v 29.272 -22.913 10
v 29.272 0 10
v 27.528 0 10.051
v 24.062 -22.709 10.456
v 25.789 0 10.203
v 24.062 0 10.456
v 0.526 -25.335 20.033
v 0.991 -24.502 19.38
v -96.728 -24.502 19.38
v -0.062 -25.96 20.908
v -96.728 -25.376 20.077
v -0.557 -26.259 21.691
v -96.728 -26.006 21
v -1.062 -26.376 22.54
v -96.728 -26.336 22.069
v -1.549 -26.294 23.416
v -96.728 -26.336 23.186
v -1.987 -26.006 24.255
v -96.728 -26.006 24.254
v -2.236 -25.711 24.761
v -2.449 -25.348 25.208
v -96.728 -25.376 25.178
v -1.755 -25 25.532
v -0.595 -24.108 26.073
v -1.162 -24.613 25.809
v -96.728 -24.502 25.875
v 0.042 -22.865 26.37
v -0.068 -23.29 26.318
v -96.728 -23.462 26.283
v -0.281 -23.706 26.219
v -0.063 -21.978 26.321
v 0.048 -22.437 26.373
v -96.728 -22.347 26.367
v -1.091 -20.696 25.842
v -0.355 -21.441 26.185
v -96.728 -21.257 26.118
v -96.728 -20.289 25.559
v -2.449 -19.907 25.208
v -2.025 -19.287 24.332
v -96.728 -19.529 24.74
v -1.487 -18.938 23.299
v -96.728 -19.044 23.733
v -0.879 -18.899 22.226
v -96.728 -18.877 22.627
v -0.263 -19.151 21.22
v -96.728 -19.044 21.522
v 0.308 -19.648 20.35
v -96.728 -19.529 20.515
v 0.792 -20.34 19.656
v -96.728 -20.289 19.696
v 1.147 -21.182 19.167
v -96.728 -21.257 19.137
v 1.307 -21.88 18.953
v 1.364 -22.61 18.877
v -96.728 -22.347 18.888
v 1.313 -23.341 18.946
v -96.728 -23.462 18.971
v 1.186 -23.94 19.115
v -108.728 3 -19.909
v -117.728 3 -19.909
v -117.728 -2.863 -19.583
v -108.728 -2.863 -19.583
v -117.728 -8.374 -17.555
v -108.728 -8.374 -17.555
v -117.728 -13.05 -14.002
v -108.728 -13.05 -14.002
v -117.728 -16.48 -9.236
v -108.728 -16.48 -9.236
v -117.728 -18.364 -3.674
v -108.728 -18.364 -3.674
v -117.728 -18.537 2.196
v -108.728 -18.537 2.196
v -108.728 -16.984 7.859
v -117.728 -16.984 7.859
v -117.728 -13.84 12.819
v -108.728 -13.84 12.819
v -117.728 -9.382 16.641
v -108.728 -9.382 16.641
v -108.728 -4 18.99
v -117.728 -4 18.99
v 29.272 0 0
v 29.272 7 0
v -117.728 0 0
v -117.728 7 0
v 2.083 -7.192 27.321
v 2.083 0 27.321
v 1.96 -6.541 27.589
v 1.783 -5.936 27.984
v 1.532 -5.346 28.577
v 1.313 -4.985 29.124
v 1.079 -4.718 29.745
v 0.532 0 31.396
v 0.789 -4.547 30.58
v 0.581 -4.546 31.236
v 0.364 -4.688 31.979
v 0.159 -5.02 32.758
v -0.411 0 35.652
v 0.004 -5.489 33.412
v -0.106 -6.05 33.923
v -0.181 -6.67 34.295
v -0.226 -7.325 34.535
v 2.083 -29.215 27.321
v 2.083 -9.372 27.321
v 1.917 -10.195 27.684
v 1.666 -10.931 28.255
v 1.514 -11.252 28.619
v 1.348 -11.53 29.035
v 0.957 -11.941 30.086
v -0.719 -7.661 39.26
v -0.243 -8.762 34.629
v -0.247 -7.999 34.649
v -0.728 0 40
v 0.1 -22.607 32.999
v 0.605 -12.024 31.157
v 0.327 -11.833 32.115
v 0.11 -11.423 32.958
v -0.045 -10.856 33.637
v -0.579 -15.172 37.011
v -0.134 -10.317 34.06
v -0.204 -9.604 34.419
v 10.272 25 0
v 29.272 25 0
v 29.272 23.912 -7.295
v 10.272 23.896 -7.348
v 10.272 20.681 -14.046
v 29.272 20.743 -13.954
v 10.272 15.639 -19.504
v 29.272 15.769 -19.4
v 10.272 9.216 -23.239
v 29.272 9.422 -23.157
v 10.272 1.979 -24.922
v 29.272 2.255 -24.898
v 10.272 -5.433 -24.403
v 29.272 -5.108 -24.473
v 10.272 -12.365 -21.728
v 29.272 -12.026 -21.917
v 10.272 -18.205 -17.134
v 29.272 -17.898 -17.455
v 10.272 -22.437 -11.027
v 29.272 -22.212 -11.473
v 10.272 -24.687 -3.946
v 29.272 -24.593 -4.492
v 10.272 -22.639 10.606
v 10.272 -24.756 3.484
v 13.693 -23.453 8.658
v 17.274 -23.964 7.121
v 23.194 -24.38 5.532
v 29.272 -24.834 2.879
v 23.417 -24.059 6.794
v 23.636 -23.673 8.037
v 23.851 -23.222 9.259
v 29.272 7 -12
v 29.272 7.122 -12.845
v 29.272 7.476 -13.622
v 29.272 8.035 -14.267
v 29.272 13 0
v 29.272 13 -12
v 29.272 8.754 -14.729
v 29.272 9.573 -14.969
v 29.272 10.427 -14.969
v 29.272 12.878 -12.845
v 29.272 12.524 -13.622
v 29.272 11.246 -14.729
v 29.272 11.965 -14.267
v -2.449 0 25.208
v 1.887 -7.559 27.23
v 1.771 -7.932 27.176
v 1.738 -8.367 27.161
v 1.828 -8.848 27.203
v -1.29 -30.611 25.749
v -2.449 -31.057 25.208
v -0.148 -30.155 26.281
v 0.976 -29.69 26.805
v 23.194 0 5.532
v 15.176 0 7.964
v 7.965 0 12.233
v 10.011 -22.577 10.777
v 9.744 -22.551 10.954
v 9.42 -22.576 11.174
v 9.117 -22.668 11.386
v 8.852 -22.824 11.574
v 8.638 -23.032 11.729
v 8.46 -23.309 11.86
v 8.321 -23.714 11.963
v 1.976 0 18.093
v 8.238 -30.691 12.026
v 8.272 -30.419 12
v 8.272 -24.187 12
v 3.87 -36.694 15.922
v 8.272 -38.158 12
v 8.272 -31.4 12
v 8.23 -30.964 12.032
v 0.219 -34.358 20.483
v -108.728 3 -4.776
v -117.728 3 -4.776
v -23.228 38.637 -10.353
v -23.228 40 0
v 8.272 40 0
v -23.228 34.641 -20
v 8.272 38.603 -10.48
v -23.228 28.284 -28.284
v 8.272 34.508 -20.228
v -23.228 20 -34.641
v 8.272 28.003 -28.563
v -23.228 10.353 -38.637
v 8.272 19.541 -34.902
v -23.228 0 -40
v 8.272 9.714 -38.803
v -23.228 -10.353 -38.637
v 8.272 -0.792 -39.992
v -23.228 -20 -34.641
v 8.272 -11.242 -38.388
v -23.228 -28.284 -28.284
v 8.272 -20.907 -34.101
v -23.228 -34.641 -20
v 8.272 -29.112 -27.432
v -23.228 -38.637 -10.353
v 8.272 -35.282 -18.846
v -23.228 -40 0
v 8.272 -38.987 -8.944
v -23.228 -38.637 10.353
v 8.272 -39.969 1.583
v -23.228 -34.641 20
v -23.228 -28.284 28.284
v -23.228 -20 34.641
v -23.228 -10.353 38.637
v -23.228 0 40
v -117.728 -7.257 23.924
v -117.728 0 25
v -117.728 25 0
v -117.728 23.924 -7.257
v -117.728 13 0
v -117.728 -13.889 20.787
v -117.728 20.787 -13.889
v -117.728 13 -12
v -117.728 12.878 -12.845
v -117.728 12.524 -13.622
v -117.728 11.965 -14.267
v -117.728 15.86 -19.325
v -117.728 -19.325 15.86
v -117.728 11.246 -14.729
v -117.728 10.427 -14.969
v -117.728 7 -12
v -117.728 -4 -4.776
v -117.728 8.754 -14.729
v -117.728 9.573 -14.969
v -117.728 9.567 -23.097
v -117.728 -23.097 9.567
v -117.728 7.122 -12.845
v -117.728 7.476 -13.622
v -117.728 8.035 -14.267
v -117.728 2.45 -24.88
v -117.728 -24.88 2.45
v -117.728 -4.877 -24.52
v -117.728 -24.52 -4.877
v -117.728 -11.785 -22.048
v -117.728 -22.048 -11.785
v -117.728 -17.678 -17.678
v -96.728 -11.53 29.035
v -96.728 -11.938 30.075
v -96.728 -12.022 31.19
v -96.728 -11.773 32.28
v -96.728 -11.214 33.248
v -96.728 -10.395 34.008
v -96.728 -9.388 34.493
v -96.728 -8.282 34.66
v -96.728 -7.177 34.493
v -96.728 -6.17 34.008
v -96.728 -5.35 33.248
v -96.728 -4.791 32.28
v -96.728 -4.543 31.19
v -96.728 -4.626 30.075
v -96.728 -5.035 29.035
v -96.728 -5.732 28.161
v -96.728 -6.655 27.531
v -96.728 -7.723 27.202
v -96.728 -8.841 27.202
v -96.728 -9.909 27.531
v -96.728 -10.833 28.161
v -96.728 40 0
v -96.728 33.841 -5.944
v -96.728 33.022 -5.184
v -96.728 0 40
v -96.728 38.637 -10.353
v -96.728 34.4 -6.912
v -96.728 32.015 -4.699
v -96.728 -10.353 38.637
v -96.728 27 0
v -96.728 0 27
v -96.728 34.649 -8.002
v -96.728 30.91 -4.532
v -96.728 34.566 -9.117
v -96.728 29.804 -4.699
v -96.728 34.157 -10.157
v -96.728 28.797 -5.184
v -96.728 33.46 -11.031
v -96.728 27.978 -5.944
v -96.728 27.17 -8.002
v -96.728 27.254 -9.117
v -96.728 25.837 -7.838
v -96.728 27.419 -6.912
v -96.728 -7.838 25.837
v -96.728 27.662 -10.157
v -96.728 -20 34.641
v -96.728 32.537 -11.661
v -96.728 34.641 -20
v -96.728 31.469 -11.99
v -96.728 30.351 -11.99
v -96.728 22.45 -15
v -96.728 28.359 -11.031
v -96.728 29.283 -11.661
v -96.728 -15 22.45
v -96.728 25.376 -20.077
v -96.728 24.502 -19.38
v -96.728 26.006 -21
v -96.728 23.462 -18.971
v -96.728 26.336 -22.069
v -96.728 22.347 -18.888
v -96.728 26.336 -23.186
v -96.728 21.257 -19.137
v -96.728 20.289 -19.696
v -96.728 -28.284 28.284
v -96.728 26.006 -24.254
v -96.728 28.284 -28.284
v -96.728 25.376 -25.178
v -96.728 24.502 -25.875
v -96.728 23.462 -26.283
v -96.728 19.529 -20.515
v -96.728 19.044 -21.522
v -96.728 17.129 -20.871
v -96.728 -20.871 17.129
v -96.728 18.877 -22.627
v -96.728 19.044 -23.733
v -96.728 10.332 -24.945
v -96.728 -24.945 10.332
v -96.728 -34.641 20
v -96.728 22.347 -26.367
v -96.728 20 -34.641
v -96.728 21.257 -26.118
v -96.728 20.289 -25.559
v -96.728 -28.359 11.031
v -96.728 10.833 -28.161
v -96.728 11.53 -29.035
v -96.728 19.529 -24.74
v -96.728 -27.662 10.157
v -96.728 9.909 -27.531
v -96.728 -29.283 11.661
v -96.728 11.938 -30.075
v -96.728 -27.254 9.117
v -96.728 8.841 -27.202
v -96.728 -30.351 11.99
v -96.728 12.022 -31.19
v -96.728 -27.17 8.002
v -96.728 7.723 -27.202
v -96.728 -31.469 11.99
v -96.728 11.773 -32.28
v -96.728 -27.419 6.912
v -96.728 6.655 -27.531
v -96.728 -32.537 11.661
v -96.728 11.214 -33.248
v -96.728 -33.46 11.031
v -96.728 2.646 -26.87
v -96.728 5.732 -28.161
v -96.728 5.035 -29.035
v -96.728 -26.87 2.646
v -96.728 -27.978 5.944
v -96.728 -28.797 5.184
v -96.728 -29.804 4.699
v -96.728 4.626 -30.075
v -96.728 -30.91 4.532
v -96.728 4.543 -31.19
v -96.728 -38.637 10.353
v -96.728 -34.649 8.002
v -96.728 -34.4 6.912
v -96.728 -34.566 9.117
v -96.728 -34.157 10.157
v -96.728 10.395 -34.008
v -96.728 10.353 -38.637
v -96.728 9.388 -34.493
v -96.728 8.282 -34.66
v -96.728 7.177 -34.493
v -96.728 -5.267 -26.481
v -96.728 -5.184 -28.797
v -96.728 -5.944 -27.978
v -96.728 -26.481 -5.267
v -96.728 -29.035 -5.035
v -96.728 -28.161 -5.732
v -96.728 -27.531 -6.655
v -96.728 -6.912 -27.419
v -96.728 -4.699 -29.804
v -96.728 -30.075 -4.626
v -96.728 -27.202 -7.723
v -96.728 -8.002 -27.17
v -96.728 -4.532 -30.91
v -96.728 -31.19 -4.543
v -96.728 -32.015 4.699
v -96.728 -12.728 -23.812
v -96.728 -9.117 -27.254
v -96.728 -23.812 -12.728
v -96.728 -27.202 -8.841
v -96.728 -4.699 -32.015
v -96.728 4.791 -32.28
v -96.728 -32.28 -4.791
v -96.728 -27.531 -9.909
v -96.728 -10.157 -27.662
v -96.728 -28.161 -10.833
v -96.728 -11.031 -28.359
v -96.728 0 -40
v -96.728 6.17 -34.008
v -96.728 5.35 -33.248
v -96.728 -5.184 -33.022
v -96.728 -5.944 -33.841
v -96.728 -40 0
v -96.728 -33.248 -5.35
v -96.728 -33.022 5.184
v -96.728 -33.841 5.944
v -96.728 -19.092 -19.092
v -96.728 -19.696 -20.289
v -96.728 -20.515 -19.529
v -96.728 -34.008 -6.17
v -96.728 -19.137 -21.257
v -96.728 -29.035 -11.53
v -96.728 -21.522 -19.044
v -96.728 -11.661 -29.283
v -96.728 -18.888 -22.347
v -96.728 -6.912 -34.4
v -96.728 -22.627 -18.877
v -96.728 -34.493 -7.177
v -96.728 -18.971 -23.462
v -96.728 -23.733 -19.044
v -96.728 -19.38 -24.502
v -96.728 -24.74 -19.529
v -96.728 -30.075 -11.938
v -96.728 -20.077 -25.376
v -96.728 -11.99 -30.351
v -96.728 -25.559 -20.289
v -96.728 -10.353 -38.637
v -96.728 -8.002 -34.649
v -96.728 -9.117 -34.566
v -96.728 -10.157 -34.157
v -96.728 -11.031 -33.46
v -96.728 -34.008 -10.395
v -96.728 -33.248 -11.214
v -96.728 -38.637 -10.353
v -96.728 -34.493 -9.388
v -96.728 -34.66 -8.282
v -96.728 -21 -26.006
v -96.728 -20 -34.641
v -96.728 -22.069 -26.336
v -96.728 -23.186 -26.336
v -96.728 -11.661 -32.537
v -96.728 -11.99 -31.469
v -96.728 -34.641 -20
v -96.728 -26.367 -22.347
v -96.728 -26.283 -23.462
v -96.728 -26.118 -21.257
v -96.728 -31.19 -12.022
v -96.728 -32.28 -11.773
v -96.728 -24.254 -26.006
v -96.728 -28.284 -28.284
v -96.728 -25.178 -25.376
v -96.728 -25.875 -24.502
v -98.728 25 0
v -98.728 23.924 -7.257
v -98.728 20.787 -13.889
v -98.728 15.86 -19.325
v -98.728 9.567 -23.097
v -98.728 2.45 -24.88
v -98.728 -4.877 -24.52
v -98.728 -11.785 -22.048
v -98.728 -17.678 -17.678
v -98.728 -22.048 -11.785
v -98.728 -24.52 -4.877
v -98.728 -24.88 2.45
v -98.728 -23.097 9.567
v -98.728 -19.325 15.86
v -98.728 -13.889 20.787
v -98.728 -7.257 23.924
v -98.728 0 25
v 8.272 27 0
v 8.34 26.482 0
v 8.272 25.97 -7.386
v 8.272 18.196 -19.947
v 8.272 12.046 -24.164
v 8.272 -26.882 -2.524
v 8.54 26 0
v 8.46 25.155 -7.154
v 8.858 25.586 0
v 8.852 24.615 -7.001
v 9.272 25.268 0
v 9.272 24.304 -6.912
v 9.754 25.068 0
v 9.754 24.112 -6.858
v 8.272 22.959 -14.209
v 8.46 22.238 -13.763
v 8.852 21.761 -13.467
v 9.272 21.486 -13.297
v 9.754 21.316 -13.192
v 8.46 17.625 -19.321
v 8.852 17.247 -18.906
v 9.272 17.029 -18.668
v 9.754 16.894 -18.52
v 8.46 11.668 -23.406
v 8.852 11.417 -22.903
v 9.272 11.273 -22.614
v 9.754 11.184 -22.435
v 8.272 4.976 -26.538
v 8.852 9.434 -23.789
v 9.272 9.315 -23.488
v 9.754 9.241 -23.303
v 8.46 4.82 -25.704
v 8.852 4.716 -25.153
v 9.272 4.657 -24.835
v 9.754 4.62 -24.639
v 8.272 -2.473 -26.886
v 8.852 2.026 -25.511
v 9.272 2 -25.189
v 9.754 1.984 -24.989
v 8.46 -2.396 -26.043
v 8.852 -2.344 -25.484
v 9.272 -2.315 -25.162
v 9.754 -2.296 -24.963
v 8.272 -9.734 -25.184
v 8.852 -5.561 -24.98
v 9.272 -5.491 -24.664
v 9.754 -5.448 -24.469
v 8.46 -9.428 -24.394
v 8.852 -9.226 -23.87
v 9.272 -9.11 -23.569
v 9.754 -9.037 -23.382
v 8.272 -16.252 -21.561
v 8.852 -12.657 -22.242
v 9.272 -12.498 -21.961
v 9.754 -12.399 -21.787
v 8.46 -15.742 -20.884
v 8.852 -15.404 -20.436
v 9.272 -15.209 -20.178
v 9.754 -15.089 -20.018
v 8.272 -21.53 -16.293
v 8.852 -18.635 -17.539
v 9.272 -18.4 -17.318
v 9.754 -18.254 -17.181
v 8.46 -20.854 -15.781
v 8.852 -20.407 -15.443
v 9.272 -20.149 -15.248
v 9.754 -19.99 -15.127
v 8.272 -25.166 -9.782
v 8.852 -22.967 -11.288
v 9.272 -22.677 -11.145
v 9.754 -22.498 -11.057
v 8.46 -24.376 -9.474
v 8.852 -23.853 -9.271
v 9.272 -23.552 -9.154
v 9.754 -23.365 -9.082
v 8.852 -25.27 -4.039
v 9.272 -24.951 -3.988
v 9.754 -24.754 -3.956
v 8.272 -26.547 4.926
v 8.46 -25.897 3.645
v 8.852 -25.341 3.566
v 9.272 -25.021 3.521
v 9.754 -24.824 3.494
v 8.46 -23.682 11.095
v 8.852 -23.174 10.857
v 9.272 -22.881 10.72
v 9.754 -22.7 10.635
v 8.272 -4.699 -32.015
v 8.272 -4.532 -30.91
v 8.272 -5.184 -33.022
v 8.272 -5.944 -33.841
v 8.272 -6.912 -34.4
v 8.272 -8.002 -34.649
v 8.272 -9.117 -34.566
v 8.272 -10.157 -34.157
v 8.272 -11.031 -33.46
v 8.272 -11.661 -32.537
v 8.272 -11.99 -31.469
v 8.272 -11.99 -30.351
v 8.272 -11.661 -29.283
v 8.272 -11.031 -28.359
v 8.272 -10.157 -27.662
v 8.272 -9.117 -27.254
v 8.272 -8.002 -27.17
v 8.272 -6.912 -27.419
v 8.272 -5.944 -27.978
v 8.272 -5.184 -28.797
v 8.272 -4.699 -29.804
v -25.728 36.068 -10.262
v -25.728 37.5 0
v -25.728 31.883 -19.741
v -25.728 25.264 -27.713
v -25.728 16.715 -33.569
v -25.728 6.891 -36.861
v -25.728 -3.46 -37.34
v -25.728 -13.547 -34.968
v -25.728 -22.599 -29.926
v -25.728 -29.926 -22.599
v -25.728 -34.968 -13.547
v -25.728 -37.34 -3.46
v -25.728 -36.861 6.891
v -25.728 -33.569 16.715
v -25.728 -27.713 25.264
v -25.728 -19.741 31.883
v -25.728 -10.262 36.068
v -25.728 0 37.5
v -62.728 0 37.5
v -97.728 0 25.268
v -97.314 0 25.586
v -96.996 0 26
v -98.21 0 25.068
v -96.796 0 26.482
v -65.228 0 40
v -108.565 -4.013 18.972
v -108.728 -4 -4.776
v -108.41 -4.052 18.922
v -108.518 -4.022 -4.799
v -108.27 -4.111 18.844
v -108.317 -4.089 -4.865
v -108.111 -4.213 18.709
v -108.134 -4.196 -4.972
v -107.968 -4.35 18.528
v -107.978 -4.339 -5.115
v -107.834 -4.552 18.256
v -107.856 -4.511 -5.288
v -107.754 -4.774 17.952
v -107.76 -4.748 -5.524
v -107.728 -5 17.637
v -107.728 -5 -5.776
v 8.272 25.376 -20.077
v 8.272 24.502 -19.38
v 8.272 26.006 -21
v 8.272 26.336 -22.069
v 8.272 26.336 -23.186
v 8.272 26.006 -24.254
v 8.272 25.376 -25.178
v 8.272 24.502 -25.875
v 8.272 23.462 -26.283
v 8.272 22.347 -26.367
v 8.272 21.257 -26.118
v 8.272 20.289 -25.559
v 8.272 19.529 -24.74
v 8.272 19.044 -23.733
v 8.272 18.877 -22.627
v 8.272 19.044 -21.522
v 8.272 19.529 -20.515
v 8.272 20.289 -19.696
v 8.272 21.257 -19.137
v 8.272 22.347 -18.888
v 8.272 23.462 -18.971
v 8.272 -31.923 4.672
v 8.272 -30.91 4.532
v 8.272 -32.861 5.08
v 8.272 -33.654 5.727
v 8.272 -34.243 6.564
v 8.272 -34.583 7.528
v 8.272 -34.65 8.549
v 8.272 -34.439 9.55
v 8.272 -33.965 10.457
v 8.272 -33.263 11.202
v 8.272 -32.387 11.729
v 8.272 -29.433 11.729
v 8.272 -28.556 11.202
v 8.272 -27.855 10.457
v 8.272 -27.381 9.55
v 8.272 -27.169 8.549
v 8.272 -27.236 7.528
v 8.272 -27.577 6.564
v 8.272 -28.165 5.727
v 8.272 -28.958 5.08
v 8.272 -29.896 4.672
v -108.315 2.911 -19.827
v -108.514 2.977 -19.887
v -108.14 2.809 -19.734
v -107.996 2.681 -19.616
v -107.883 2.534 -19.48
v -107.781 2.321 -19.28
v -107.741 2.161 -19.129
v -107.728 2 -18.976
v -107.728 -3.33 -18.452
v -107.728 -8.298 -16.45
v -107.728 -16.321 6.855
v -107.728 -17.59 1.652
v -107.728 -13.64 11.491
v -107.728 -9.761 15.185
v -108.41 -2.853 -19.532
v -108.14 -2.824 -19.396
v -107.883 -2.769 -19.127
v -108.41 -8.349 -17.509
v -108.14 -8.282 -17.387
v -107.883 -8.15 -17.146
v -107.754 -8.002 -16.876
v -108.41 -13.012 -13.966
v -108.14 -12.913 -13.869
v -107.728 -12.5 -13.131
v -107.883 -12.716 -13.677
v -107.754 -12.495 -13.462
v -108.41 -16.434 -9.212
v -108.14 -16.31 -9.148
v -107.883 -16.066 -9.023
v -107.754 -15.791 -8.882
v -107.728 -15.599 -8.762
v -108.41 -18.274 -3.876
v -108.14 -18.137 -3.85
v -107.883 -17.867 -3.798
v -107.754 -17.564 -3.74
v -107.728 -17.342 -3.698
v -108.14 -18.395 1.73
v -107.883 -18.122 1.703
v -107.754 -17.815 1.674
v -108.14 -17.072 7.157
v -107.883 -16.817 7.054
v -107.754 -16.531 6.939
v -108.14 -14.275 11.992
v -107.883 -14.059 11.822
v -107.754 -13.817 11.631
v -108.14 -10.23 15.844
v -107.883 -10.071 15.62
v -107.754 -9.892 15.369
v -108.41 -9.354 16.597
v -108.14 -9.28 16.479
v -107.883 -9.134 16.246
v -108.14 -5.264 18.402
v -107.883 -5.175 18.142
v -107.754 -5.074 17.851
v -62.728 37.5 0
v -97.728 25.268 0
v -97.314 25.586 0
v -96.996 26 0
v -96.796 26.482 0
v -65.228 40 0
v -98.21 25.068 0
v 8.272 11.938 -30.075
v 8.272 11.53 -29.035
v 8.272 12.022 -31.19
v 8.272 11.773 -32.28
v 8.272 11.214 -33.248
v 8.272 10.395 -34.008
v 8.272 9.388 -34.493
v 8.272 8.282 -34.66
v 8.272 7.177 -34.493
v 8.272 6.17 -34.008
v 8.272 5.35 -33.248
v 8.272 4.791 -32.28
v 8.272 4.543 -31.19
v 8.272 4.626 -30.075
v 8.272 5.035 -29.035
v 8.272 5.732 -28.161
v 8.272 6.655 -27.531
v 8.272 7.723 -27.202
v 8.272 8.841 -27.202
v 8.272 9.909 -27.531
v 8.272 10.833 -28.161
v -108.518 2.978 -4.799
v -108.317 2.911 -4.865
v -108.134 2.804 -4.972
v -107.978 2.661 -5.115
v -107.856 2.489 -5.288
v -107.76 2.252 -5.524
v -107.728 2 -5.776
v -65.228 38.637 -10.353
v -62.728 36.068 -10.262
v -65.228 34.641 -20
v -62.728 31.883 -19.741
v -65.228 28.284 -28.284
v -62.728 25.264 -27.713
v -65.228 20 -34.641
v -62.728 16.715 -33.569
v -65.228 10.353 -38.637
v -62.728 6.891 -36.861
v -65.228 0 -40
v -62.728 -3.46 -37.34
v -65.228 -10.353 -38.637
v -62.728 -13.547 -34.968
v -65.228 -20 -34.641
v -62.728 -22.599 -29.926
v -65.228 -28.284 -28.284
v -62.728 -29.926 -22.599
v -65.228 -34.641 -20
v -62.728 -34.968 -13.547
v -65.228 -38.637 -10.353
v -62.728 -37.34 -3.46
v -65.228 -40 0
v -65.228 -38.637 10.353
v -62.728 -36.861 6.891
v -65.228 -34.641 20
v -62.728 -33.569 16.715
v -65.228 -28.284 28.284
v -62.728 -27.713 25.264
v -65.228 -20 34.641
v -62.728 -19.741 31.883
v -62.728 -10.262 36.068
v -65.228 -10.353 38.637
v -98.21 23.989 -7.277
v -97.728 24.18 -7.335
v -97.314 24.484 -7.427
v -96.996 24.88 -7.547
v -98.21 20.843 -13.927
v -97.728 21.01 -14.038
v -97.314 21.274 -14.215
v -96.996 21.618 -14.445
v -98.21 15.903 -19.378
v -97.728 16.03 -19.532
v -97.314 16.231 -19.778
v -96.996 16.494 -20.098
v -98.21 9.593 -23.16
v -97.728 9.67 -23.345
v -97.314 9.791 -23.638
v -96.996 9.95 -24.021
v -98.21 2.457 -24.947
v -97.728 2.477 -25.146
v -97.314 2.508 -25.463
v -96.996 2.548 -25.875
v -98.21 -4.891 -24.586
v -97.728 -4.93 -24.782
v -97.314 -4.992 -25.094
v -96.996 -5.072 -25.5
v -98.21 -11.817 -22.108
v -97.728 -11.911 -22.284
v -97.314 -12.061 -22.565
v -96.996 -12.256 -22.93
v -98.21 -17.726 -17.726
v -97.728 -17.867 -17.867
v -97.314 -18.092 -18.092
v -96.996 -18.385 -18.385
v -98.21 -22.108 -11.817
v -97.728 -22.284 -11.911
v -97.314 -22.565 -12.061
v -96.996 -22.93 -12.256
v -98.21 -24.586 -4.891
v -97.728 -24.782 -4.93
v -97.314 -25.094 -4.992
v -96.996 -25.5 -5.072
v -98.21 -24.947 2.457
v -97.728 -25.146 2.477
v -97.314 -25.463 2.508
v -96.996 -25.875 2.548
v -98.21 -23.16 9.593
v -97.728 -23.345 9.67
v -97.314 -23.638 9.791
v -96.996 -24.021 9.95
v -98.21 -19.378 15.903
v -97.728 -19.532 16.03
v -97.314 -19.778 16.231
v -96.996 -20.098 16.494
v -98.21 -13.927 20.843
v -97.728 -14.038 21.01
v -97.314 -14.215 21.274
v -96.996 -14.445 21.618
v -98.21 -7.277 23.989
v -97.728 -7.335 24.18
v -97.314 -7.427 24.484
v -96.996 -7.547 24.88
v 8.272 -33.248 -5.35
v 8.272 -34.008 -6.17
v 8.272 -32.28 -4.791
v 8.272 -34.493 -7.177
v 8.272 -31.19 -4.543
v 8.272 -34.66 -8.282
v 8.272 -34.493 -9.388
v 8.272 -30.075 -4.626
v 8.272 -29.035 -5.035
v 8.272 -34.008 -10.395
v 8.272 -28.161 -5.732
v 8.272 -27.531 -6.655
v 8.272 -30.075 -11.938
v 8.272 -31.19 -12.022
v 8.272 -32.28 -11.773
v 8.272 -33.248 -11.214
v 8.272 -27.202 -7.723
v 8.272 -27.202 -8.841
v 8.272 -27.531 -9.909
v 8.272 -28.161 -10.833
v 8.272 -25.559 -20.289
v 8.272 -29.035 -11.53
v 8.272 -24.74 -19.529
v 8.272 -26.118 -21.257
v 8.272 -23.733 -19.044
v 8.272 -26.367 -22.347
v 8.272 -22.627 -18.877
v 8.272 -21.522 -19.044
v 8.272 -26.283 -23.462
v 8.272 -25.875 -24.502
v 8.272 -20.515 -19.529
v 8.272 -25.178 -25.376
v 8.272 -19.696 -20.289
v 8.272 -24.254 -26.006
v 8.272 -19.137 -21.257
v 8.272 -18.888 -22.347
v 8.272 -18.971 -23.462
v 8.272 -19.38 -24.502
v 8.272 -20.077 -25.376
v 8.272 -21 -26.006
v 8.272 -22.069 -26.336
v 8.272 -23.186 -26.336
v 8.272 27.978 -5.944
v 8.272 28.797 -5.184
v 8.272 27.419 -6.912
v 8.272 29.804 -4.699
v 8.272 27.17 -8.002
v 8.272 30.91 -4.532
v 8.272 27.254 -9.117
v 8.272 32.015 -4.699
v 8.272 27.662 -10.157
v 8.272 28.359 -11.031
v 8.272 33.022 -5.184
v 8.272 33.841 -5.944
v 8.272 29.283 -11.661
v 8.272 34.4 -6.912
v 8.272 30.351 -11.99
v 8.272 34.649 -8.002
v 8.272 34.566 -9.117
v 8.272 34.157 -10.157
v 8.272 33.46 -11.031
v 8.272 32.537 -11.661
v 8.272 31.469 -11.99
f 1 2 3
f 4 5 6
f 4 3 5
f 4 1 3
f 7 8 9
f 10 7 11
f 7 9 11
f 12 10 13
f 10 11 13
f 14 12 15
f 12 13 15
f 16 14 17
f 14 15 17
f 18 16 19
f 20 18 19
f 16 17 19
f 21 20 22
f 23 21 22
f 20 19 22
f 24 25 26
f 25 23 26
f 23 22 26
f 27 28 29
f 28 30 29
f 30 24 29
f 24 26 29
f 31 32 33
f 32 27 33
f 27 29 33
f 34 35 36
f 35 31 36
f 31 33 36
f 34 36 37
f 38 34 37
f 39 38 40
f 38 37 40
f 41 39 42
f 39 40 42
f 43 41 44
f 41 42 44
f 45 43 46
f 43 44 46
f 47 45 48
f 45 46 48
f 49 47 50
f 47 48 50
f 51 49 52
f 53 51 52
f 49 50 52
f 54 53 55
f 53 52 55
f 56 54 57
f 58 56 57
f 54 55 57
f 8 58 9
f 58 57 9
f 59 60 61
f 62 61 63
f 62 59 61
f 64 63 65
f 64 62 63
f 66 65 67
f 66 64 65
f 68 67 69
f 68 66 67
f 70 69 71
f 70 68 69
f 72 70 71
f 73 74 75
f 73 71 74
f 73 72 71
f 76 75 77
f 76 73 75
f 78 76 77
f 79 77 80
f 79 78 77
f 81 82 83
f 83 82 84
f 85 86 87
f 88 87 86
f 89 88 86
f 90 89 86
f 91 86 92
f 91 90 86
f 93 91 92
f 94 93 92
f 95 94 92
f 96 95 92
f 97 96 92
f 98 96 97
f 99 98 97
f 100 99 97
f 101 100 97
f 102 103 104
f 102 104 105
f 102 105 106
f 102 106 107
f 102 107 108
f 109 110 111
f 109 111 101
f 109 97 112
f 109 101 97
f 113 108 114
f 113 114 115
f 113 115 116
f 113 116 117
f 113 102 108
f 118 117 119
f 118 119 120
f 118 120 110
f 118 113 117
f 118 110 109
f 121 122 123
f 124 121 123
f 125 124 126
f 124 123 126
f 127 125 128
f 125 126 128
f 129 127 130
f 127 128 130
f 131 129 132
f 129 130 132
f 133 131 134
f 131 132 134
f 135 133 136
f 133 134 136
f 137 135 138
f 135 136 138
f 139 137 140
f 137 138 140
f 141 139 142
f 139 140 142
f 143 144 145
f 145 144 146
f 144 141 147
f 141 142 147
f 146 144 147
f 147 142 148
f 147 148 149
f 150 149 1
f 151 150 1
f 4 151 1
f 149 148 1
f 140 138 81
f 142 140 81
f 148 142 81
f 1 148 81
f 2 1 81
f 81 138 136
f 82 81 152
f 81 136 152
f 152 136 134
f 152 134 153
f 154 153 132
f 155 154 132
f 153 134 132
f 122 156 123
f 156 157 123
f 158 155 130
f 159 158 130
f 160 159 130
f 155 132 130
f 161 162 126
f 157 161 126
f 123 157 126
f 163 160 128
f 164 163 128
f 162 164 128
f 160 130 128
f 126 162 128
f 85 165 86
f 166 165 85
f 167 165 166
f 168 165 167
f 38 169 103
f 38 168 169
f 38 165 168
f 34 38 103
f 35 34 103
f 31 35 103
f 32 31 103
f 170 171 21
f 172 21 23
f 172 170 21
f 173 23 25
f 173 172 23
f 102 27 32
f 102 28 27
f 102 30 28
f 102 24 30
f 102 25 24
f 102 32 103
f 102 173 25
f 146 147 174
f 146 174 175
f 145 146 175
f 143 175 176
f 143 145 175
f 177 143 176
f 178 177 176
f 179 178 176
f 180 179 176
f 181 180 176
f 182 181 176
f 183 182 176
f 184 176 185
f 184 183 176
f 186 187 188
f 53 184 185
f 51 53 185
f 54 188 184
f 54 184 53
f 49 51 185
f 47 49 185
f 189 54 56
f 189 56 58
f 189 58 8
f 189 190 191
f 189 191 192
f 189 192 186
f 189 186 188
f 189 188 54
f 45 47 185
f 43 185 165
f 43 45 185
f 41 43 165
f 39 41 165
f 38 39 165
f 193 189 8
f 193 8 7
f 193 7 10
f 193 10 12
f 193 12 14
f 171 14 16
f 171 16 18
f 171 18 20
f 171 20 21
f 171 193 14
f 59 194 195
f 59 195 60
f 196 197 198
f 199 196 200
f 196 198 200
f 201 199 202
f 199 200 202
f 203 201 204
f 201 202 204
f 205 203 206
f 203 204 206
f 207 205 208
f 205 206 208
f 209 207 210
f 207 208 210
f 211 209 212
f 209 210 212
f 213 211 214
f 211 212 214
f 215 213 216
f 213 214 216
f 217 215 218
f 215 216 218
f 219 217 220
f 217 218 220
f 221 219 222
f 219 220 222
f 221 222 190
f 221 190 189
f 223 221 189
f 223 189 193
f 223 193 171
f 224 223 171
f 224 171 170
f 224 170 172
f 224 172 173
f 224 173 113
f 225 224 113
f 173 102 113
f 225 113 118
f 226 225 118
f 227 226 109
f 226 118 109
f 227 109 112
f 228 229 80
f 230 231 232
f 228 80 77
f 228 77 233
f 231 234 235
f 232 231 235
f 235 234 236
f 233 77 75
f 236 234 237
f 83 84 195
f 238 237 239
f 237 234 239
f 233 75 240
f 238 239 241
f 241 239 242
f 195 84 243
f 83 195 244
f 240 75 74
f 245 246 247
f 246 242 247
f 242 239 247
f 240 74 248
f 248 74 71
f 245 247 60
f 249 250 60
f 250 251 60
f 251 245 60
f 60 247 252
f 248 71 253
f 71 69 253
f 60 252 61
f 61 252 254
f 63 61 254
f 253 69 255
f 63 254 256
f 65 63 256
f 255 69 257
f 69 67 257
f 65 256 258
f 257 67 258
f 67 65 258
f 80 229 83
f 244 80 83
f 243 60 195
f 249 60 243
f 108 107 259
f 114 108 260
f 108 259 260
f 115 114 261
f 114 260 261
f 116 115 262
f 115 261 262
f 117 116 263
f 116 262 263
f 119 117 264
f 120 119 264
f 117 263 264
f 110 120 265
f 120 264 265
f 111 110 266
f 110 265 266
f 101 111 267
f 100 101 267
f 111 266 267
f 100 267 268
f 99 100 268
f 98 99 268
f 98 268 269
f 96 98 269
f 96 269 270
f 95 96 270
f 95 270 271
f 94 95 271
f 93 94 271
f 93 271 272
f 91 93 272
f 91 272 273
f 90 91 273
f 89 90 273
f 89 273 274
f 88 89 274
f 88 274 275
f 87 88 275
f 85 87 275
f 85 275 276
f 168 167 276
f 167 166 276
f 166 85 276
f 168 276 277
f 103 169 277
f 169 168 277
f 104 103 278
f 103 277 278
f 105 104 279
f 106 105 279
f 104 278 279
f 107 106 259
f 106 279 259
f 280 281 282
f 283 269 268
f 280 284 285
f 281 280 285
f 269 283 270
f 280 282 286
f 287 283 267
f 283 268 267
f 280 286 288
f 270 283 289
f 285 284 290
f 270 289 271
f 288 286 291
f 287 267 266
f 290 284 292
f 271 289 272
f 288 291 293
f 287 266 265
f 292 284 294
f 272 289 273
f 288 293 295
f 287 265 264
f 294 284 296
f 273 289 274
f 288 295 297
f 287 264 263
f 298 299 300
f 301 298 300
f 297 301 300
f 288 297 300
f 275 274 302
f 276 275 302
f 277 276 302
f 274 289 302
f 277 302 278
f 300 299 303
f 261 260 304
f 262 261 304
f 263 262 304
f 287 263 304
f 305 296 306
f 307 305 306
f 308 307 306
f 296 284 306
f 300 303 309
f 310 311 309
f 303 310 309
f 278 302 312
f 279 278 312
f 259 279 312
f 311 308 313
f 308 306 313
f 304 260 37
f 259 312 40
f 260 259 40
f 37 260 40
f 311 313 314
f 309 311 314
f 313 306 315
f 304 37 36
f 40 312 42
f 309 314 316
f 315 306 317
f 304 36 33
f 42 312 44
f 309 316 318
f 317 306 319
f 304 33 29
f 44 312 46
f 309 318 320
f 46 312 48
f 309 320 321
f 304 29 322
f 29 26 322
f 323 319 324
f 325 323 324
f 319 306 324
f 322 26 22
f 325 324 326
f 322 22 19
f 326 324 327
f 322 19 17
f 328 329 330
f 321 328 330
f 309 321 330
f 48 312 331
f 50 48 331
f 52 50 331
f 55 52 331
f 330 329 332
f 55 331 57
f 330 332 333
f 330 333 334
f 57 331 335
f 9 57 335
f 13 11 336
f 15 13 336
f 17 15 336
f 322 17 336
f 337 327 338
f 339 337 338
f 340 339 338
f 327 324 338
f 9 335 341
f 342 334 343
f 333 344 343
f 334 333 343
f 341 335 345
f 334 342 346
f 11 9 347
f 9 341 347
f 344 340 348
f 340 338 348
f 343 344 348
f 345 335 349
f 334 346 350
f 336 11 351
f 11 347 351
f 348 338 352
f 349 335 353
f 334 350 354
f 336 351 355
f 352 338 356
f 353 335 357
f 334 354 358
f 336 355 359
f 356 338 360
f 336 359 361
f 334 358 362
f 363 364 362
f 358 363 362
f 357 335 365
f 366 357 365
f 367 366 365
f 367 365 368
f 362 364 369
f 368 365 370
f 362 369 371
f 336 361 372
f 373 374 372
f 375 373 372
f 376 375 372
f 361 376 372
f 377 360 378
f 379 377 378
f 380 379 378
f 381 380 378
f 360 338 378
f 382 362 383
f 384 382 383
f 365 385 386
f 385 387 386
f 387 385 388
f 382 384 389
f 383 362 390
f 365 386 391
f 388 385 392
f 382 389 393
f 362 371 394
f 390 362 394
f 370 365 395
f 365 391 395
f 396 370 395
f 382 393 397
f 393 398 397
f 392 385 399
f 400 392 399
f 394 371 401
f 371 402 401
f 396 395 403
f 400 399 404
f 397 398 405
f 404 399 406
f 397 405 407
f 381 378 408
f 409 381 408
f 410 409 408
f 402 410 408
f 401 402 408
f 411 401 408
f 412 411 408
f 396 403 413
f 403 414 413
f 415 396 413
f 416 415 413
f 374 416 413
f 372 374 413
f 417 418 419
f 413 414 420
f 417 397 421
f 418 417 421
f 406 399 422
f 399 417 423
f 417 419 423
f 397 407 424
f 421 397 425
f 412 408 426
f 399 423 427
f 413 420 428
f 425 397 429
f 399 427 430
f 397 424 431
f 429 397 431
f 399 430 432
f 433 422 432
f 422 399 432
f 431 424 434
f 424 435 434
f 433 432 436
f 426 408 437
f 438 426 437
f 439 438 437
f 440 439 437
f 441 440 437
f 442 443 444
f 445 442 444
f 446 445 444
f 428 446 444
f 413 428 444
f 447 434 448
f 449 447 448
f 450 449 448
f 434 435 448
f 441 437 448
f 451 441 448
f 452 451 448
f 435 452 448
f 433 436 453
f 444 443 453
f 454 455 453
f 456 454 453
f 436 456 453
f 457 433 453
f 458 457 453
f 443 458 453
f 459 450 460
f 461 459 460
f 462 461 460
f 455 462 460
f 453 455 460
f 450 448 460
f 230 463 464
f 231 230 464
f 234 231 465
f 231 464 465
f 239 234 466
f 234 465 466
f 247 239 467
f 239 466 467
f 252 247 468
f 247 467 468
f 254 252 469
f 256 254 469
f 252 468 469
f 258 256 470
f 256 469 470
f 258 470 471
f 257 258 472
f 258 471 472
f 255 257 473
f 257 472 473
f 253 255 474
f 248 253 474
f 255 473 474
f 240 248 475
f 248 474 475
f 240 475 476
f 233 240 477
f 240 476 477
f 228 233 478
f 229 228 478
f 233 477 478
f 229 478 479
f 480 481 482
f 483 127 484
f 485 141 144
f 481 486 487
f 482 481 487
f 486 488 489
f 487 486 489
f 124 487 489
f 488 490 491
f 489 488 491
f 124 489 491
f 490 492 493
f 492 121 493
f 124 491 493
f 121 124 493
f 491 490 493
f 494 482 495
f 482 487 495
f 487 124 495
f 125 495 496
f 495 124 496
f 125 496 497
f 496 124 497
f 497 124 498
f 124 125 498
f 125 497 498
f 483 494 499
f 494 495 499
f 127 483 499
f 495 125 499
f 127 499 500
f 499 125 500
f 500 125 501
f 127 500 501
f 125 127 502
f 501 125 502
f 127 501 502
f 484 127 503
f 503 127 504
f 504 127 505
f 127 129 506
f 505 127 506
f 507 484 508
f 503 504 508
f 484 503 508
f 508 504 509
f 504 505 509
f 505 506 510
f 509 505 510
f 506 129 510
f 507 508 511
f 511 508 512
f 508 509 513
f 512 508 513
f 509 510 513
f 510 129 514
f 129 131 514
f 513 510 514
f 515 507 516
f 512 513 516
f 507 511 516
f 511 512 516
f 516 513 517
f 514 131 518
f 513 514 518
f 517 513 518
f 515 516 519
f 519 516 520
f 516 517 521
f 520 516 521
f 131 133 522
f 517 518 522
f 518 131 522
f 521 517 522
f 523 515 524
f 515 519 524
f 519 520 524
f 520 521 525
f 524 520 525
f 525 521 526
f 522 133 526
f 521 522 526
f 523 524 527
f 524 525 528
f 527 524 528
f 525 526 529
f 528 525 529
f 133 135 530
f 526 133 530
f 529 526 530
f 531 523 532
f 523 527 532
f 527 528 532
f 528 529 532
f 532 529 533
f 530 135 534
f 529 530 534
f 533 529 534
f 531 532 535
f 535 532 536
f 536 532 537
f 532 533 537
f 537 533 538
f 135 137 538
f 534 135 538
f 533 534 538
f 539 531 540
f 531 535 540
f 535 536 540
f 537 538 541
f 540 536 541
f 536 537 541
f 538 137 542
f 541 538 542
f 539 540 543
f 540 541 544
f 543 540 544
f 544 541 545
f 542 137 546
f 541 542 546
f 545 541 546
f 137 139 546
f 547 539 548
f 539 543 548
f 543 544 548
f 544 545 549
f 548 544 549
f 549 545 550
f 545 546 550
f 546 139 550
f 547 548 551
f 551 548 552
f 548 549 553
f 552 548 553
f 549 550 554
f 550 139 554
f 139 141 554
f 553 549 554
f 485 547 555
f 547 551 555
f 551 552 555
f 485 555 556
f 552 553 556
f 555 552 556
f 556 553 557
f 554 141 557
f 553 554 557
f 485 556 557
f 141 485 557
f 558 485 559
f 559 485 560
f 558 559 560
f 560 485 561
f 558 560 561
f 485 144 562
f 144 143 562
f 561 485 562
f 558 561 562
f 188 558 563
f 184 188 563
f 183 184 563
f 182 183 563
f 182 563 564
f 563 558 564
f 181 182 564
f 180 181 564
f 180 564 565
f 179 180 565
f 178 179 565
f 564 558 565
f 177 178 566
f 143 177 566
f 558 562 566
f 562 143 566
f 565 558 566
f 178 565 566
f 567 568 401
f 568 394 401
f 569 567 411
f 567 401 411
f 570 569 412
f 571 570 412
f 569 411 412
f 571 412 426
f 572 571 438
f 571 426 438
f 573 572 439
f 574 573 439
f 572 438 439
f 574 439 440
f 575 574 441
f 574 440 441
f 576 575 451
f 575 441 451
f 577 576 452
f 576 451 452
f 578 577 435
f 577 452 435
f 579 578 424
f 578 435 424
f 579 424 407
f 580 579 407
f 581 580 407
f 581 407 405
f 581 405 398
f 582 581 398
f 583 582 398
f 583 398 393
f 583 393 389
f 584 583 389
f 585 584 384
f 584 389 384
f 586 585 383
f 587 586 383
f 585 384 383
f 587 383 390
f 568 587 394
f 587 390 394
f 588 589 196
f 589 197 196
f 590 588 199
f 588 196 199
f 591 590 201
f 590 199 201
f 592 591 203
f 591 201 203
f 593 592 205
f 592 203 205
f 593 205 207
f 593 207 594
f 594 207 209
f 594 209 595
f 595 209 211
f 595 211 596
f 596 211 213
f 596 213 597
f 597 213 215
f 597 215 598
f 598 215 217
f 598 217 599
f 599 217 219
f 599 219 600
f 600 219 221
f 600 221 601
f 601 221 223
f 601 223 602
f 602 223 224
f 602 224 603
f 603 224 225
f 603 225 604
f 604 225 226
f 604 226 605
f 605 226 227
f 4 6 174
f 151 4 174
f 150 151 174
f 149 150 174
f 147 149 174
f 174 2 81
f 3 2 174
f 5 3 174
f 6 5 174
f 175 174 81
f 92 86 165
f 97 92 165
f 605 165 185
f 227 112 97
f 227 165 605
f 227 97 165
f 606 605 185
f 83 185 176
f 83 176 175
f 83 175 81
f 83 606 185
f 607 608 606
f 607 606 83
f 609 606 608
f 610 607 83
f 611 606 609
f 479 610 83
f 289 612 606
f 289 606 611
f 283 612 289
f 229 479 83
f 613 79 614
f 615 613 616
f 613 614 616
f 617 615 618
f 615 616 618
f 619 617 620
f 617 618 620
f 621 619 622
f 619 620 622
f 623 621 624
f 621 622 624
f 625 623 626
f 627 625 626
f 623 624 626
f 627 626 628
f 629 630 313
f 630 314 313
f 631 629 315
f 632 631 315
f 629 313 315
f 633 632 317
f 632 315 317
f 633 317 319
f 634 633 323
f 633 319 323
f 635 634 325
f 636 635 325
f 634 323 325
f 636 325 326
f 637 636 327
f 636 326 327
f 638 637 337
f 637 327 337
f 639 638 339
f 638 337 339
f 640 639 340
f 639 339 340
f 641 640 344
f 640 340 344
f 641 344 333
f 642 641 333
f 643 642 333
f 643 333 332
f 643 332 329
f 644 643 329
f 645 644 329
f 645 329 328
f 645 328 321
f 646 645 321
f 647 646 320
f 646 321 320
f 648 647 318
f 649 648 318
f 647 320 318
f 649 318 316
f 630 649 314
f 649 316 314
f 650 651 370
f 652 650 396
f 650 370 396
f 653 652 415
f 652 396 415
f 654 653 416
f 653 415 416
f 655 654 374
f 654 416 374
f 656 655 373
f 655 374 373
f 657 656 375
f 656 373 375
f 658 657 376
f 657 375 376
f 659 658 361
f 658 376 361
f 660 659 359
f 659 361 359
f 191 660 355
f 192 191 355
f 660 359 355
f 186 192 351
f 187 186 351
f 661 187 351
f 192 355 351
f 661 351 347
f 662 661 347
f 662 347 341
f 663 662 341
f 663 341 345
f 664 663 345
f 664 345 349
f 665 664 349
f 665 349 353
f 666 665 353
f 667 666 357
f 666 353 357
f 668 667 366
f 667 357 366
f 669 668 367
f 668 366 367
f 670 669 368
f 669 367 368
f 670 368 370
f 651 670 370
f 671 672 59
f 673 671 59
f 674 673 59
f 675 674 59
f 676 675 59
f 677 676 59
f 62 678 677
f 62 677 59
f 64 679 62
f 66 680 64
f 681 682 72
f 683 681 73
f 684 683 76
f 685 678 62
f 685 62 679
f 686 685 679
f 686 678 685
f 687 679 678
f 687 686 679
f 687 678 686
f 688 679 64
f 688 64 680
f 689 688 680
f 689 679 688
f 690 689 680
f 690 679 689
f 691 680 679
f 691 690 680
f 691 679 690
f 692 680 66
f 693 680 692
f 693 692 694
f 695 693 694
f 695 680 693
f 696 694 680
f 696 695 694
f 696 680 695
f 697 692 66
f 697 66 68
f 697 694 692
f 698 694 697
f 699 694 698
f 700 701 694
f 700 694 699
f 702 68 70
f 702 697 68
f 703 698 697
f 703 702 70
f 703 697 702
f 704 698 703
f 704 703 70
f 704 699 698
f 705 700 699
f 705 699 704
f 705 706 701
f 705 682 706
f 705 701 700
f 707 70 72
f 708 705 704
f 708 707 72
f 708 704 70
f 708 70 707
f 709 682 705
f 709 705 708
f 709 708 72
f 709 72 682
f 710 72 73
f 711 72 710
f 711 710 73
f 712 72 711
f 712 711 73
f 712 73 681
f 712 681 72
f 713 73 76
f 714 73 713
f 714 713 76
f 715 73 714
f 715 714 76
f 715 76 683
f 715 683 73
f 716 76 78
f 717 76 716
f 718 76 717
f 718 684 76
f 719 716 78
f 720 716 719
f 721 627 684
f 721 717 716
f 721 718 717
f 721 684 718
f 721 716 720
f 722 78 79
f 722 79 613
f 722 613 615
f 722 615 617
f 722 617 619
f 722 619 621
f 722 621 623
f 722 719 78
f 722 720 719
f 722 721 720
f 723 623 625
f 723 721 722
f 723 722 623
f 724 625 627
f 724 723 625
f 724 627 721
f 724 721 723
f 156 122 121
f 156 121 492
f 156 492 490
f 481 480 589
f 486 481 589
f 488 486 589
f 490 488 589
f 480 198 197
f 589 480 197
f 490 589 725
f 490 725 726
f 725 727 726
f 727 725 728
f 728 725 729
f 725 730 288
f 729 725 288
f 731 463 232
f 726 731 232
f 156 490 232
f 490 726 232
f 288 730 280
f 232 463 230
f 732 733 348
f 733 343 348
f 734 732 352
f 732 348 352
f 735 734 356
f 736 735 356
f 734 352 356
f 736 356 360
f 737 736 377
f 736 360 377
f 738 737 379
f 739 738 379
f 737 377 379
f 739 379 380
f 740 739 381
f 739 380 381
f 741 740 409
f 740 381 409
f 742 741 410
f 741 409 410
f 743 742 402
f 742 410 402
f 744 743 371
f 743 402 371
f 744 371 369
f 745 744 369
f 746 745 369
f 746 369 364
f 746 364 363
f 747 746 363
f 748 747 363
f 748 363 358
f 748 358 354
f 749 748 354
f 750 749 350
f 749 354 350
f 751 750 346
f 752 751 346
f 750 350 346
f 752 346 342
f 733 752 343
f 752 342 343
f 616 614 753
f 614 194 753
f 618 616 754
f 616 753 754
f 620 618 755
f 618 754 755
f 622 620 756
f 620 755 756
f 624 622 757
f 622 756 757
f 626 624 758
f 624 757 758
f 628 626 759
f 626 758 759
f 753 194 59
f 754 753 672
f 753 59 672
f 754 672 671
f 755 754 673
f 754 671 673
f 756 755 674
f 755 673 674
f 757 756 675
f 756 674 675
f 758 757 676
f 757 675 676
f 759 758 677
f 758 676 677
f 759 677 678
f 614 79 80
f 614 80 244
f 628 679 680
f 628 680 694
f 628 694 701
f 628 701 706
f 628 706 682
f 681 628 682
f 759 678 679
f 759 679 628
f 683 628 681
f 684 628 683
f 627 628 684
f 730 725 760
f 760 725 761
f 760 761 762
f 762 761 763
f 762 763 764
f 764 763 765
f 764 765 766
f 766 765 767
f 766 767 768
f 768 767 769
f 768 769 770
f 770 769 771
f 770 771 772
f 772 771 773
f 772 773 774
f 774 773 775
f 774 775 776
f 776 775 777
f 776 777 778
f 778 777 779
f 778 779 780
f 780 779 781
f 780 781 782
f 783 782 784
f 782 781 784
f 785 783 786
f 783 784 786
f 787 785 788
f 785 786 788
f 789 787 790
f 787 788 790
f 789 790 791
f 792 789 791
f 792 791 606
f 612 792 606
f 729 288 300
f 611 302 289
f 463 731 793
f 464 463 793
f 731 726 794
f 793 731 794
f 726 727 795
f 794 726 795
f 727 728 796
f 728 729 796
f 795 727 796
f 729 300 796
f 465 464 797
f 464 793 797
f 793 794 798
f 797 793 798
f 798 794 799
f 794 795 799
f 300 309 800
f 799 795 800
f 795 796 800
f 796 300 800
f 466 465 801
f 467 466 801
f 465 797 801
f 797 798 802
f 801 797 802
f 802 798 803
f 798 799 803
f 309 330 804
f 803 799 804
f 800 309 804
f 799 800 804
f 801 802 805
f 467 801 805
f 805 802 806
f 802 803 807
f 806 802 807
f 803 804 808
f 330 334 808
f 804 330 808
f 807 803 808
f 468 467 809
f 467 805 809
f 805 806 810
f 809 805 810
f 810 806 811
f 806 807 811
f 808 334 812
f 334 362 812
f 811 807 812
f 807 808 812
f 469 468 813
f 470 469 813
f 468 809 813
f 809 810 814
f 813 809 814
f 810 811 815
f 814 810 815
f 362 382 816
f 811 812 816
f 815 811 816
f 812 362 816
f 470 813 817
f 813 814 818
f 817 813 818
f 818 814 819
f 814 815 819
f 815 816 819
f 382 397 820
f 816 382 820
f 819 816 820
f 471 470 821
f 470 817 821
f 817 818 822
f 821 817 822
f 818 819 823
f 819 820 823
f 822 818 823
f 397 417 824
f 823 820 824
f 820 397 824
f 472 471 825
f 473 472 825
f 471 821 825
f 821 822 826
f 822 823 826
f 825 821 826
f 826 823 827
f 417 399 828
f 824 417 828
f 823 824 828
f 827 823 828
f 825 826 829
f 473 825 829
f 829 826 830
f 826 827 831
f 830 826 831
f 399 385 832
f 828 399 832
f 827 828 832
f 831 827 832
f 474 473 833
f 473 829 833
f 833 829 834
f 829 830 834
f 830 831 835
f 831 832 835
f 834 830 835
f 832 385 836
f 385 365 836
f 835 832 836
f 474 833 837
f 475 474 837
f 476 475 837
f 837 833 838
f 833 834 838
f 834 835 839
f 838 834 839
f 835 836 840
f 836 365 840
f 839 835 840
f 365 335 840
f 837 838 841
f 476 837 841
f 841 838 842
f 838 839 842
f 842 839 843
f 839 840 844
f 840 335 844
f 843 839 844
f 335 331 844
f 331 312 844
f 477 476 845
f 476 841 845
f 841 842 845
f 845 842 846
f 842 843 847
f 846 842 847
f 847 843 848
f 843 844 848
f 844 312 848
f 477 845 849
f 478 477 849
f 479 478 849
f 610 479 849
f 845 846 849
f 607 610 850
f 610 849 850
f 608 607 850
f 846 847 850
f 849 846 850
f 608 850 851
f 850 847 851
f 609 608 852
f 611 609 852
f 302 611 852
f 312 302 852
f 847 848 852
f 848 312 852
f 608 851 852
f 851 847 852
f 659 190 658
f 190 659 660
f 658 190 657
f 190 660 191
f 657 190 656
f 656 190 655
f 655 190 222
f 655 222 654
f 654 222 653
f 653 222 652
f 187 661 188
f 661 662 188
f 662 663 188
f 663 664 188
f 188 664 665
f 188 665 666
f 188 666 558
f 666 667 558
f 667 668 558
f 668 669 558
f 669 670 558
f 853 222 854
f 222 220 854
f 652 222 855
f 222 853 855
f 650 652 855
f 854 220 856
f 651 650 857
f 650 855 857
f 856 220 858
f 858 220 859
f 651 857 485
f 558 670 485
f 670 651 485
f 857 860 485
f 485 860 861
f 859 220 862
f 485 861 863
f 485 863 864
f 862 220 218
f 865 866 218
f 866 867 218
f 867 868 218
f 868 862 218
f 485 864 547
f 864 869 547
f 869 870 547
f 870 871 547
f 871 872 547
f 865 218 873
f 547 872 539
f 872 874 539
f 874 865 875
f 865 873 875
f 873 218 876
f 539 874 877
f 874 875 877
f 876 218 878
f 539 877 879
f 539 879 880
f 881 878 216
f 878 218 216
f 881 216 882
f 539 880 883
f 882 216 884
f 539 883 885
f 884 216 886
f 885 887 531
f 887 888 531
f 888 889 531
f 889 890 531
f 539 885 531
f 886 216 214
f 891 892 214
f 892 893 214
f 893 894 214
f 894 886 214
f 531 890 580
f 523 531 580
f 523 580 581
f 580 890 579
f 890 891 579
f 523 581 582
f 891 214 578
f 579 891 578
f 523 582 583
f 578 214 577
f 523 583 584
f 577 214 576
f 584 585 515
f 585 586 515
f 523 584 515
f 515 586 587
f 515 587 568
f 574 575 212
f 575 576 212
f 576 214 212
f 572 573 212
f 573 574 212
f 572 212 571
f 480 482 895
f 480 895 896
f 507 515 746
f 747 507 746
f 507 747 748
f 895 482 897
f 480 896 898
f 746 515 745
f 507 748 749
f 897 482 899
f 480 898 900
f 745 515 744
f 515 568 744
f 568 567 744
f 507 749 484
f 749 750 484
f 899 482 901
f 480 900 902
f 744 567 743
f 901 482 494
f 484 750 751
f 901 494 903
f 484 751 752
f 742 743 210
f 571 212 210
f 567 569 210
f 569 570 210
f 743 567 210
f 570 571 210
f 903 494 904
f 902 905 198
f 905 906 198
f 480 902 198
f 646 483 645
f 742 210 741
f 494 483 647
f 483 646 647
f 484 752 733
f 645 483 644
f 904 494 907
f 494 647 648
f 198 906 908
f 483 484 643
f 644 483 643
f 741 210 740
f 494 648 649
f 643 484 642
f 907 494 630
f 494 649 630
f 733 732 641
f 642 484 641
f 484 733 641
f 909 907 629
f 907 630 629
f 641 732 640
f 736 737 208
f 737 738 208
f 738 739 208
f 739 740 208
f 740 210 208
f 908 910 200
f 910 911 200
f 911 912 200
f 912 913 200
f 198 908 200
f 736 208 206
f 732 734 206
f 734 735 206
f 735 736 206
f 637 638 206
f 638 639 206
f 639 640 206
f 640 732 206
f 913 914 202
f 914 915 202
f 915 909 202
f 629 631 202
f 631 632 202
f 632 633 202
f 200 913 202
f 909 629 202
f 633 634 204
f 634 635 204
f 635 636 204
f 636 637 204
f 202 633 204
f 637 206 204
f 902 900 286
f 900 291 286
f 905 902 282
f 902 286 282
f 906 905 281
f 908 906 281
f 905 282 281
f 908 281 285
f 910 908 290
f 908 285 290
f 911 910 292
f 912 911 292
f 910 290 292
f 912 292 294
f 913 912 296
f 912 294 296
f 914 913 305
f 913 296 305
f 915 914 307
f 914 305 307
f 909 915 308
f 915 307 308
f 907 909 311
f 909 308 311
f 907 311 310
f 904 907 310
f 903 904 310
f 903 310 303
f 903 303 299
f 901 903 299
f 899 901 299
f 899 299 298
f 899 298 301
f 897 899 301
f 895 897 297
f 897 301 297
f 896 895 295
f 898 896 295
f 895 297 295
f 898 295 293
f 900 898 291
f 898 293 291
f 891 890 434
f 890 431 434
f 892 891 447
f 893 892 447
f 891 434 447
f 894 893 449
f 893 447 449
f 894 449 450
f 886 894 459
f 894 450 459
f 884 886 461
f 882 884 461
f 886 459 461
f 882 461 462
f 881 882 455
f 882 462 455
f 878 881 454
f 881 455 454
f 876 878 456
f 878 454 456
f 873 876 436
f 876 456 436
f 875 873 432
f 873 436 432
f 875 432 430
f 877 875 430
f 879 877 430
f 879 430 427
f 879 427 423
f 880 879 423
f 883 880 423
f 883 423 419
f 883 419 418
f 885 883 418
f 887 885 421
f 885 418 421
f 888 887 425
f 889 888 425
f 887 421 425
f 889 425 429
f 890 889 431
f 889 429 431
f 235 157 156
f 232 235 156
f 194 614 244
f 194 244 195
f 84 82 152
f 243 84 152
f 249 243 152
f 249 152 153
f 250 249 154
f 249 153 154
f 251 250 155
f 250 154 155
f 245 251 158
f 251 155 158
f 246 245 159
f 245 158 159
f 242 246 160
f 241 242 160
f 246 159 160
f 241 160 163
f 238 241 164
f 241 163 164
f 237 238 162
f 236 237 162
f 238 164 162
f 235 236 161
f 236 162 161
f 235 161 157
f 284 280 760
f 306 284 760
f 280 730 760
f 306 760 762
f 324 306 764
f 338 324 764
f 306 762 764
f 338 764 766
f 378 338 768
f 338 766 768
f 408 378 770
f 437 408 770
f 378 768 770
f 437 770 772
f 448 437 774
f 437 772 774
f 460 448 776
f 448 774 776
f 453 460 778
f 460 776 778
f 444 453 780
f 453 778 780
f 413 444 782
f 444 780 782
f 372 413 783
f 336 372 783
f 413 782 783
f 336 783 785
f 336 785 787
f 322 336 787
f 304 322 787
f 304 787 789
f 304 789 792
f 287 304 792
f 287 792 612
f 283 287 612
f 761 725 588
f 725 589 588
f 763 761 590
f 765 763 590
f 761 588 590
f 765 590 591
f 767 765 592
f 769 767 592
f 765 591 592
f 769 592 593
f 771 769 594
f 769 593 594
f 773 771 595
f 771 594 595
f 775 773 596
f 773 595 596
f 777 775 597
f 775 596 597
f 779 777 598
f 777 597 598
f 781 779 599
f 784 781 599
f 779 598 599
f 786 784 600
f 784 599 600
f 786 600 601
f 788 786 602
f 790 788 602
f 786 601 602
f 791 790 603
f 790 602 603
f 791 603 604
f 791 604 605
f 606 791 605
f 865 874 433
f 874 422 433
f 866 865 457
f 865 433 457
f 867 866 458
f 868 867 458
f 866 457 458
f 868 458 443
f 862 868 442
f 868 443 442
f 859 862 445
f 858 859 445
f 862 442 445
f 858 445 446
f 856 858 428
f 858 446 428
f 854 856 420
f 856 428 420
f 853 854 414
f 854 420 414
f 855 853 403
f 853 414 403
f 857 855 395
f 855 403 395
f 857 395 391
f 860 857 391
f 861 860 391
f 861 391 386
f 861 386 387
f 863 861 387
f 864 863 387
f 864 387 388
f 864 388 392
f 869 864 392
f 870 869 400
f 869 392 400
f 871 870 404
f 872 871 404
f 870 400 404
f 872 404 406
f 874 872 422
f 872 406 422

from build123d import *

# Parameters (mm, degrees)
R_VOLUTION1_ANGLE            = 270
ENL_V_MAT_EXTRU_1_DEPTH      = 158.508729917
ENL_V_MAT_EXTRU_1_DEPTH_BACK = 158.508729917
CONG_1_R                     = 2
ESQUISSE6_R                  = 3.75
ENL_V_MAT_EXTRU_2_DEPTH      = 139.115893365
R_P_TITION_CIRCULAIRE2_COUNT = 12
ENL_V_MAT_EXTRU_3_DEPTH      = 131.613532807
ENL_V_MAT_EXTRU_3_DEPTH_BACK = 131.613532807
ESQUISSE9_R                  = 30
ENL_V_MAT_EXTRU_4_DEPTH      = 158.508730061
ENL_V_MAT_EXTRU_4_DEPTH_BACK = 10
CONG_2_R                     = 1


with BuildPart() as part:
    # Esquisse1 → Révolution1 (revolve)
    with BuildSketch(Plane.XY):
        Polygon((0, 0), (-117.728055077, 0), (-117.728055077, 25), (-96.728055077, 25), (-96.728055077, 40), (-65.228055077, 40), (-62.728055077, 37.5), (-25.728055077, 37.5), (-23.228055077, 40), (8.271944923, 40), (8.271944923, 25), (29.271944923, 25), (29.271944923, 0), align=None)
    revolve(axis=Axis((0, 0, 0), (-1, 0, 0)), revolution_arc=R_VOLUTION1_ANGLE)

    # Esquisse3 → Enlèv. mat.-Extru.1 (cut, two sides: drawn at the far end of the back side and taken through both)
    with BuildSketch(Plane.ZY.offset(117.728055077).offset(-ENL_V_MAT_EXTRU_1_DEPTH_BACK)):
        with BuildLine():
            Line((-12, 13), (0, 13))
            ThreePointArc((0, 13), (3, 10), (0, 7))
            Line((0, 7), (-12, 7))
            ThreePointArc((-12, 7), (-15, 10), (-12, 13))
        make_face()
    extrude(amount=ENL_V_MAT_EXTRU_1_DEPTH + ENL_V_MAT_EXTRU_1_DEPTH_BACK, mode=Mode.SUBTRACT)

    # Congé1
    cong_1_edges = [part.edges().sort_by_distance(p)[0] for p in [
        (8.271944923, -17.67766953, -17.67766953),
        (-96.728055077, -17.67766953, -17.67766953),
    ]]
    fillet(cong_1_edges, radius=CONG_1_R)

    # Esquisse6 → Enlèv. mat.-Extru.2 (cut, symmetric)
    with BuildSketch(Plane.ZY.offset(96.728055077)):
        with Locations((-8.282209443, 30.909626441)):
            Circle(ESQUISSE6_R)
    enl_v_mat_extru_2 = extrude(amount=ENL_V_MAT_EXTRU_2_DEPTH, both=True, mode=Mode.SUBTRACT)

    # Répétition circulaire2: Enlèv. mat.-Extru.2 ×12 about axis
    r_p_tition_circulaire2_axis = Axis((0, 0, 0), (1, 0, 0))
    for i in range(1, R_P_TITION_CIRCULAIRE2_COUNT):
        add(enl_v_mat_extru_2.rotate(r_p_tition_circulaire2_axis, i * 360 / R_P_TITION_CIRCULAIRE2_COUNT), mode=Mode.SUBTRACT)

    # Esquisse9 → Enlèv. mat.-Extru.3 (cut, two sides: drawn at the far end of the back side and taken through both)
    with BuildSketch(Plane(origin=(0, 0, 0), x_dir=(1, 0, 0), z_dir=(0, 1, 0)).offset(-ENL_V_MAT_EXTRU_3_DEPTH_BACK)):
        with Locations((29.271944923, -40)):
            Circle(ESQUISSE9_R)
        with BuildLine():
            Line((29.271944923, -40), (23.194258704, -5.531728645))
            ThreePointArc((23.194258704, -5.531728645), (7.965294907, -12.23263309), (-2.448827624, -25.208360839))
            Line((-2.448827624, -25.208360839), (29.271944923, -40))
        make_face()
        with BuildLine():
            Line((29.271944923, -10), (29.271944923, -25))
            Line((29.271944923, -25), (29.271944923, -40))
            Line((29.271944923, -40), (8.271944923, -40))
            Line((8.271944923, -40), (-0.728055077, -40))
            ThreePointArc((-0.728055077, -40), (29.271944923, -70), (59.271944923, -40))
            ThreePointArc((59.271944923, -40), (50.485148358, -18.786796564), (29.271944923, -10))
        make_face()
        with BuildLine():
            Line((-0.728055077, -40), (8.271944923, -40))
            Line((8.271944923, -40), (8.271944923, -30.207539179))
            Line((8.271944923, -30.207539179), (2.082711311, -27.321452148))
            ThreePointArc((2.082711311, -27.321452148), (-0.016935291, -33.506811582), (-0.728055077, -40))
        make_face()
        with BuildLine():
            Line((26.627040212, -25), (29.271944923, -25))
            Line((29.271944923, -25), (29.271944923, -10))
            ThreePointArc((29.271944923, -10), (26.65727264, -10.114159057), (24.062499593, -10.45576741))
            Line((24.062499593, -10.45576741), (26.627040212, -25))
        make_face()
        with BuildLine():
            Line((10.271944923, -25), (26.627040212, -25))
            Line((26.627040212, -25), (24.062499593, -10.45576741))
            ThreePointArc((24.062499593, -10.45576741), (11.009102052, -16.199399791), (2.082711311, -27.321452148))
            Line((2.082711311, -27.321452148), (8.271944923, -30.207539179))
            Line((8.271944923, -30.207539179), (8.271944923, -27))
            ThreePointArc((8.271944923, -27), (8.85773136, -25.585786438), (10.271944923, -25))
        make_face()
    extrude(amount=ENL_V_MAT_EXTRU_3_DEPTH + ENL_V_MAT_EXTRU_3_DEPTH_BACK, mode=Mode.SUBTRACT)

    # Esquisse10 → Enlèv. mat.-Extru.4 (cut, two sides: drawn at the far end of the back side and taken through both)
    with BuildSketch(Plane.ZY.offset(117.728055077).offset(-ENL_V_MAT_EXTRU_4_DEPTH_BACK)):
        with BuildLine():
            Line((-4.776313653, 3), (-19.908574626, 3))
            ThreePointArc((-19.908574626, 3), (-3.674077438, -18.363865829), (18.989837064, -4))
            Line((18.989837064, -4), (-4.776313653, -4))
            Line((-4.776313653, -4), (-4.776313653, 3))
        make_face()
    extrude(amount=ENL_V_MAT_EXTRU_4_DEPTH + ENL_V_MAT_EXTRU_4_DEPTH_BACK, mode=Mode.SUBTRACT)

    # Congé2
    cong_2_edges = [part.edges().sort_by_distance(p)[0] for p in [
        (-107.728055077, 3, -12.342444139),
        (-107.728055077, -18.363865829, -3.674077438),
        (-107.728055077, -0.5, -4.776313653),
        (-107.728055077, -4, 7.106761705),
    ]]
    fillet(cong_2_edges, radius=CONG_2_R)


solid = part.part
